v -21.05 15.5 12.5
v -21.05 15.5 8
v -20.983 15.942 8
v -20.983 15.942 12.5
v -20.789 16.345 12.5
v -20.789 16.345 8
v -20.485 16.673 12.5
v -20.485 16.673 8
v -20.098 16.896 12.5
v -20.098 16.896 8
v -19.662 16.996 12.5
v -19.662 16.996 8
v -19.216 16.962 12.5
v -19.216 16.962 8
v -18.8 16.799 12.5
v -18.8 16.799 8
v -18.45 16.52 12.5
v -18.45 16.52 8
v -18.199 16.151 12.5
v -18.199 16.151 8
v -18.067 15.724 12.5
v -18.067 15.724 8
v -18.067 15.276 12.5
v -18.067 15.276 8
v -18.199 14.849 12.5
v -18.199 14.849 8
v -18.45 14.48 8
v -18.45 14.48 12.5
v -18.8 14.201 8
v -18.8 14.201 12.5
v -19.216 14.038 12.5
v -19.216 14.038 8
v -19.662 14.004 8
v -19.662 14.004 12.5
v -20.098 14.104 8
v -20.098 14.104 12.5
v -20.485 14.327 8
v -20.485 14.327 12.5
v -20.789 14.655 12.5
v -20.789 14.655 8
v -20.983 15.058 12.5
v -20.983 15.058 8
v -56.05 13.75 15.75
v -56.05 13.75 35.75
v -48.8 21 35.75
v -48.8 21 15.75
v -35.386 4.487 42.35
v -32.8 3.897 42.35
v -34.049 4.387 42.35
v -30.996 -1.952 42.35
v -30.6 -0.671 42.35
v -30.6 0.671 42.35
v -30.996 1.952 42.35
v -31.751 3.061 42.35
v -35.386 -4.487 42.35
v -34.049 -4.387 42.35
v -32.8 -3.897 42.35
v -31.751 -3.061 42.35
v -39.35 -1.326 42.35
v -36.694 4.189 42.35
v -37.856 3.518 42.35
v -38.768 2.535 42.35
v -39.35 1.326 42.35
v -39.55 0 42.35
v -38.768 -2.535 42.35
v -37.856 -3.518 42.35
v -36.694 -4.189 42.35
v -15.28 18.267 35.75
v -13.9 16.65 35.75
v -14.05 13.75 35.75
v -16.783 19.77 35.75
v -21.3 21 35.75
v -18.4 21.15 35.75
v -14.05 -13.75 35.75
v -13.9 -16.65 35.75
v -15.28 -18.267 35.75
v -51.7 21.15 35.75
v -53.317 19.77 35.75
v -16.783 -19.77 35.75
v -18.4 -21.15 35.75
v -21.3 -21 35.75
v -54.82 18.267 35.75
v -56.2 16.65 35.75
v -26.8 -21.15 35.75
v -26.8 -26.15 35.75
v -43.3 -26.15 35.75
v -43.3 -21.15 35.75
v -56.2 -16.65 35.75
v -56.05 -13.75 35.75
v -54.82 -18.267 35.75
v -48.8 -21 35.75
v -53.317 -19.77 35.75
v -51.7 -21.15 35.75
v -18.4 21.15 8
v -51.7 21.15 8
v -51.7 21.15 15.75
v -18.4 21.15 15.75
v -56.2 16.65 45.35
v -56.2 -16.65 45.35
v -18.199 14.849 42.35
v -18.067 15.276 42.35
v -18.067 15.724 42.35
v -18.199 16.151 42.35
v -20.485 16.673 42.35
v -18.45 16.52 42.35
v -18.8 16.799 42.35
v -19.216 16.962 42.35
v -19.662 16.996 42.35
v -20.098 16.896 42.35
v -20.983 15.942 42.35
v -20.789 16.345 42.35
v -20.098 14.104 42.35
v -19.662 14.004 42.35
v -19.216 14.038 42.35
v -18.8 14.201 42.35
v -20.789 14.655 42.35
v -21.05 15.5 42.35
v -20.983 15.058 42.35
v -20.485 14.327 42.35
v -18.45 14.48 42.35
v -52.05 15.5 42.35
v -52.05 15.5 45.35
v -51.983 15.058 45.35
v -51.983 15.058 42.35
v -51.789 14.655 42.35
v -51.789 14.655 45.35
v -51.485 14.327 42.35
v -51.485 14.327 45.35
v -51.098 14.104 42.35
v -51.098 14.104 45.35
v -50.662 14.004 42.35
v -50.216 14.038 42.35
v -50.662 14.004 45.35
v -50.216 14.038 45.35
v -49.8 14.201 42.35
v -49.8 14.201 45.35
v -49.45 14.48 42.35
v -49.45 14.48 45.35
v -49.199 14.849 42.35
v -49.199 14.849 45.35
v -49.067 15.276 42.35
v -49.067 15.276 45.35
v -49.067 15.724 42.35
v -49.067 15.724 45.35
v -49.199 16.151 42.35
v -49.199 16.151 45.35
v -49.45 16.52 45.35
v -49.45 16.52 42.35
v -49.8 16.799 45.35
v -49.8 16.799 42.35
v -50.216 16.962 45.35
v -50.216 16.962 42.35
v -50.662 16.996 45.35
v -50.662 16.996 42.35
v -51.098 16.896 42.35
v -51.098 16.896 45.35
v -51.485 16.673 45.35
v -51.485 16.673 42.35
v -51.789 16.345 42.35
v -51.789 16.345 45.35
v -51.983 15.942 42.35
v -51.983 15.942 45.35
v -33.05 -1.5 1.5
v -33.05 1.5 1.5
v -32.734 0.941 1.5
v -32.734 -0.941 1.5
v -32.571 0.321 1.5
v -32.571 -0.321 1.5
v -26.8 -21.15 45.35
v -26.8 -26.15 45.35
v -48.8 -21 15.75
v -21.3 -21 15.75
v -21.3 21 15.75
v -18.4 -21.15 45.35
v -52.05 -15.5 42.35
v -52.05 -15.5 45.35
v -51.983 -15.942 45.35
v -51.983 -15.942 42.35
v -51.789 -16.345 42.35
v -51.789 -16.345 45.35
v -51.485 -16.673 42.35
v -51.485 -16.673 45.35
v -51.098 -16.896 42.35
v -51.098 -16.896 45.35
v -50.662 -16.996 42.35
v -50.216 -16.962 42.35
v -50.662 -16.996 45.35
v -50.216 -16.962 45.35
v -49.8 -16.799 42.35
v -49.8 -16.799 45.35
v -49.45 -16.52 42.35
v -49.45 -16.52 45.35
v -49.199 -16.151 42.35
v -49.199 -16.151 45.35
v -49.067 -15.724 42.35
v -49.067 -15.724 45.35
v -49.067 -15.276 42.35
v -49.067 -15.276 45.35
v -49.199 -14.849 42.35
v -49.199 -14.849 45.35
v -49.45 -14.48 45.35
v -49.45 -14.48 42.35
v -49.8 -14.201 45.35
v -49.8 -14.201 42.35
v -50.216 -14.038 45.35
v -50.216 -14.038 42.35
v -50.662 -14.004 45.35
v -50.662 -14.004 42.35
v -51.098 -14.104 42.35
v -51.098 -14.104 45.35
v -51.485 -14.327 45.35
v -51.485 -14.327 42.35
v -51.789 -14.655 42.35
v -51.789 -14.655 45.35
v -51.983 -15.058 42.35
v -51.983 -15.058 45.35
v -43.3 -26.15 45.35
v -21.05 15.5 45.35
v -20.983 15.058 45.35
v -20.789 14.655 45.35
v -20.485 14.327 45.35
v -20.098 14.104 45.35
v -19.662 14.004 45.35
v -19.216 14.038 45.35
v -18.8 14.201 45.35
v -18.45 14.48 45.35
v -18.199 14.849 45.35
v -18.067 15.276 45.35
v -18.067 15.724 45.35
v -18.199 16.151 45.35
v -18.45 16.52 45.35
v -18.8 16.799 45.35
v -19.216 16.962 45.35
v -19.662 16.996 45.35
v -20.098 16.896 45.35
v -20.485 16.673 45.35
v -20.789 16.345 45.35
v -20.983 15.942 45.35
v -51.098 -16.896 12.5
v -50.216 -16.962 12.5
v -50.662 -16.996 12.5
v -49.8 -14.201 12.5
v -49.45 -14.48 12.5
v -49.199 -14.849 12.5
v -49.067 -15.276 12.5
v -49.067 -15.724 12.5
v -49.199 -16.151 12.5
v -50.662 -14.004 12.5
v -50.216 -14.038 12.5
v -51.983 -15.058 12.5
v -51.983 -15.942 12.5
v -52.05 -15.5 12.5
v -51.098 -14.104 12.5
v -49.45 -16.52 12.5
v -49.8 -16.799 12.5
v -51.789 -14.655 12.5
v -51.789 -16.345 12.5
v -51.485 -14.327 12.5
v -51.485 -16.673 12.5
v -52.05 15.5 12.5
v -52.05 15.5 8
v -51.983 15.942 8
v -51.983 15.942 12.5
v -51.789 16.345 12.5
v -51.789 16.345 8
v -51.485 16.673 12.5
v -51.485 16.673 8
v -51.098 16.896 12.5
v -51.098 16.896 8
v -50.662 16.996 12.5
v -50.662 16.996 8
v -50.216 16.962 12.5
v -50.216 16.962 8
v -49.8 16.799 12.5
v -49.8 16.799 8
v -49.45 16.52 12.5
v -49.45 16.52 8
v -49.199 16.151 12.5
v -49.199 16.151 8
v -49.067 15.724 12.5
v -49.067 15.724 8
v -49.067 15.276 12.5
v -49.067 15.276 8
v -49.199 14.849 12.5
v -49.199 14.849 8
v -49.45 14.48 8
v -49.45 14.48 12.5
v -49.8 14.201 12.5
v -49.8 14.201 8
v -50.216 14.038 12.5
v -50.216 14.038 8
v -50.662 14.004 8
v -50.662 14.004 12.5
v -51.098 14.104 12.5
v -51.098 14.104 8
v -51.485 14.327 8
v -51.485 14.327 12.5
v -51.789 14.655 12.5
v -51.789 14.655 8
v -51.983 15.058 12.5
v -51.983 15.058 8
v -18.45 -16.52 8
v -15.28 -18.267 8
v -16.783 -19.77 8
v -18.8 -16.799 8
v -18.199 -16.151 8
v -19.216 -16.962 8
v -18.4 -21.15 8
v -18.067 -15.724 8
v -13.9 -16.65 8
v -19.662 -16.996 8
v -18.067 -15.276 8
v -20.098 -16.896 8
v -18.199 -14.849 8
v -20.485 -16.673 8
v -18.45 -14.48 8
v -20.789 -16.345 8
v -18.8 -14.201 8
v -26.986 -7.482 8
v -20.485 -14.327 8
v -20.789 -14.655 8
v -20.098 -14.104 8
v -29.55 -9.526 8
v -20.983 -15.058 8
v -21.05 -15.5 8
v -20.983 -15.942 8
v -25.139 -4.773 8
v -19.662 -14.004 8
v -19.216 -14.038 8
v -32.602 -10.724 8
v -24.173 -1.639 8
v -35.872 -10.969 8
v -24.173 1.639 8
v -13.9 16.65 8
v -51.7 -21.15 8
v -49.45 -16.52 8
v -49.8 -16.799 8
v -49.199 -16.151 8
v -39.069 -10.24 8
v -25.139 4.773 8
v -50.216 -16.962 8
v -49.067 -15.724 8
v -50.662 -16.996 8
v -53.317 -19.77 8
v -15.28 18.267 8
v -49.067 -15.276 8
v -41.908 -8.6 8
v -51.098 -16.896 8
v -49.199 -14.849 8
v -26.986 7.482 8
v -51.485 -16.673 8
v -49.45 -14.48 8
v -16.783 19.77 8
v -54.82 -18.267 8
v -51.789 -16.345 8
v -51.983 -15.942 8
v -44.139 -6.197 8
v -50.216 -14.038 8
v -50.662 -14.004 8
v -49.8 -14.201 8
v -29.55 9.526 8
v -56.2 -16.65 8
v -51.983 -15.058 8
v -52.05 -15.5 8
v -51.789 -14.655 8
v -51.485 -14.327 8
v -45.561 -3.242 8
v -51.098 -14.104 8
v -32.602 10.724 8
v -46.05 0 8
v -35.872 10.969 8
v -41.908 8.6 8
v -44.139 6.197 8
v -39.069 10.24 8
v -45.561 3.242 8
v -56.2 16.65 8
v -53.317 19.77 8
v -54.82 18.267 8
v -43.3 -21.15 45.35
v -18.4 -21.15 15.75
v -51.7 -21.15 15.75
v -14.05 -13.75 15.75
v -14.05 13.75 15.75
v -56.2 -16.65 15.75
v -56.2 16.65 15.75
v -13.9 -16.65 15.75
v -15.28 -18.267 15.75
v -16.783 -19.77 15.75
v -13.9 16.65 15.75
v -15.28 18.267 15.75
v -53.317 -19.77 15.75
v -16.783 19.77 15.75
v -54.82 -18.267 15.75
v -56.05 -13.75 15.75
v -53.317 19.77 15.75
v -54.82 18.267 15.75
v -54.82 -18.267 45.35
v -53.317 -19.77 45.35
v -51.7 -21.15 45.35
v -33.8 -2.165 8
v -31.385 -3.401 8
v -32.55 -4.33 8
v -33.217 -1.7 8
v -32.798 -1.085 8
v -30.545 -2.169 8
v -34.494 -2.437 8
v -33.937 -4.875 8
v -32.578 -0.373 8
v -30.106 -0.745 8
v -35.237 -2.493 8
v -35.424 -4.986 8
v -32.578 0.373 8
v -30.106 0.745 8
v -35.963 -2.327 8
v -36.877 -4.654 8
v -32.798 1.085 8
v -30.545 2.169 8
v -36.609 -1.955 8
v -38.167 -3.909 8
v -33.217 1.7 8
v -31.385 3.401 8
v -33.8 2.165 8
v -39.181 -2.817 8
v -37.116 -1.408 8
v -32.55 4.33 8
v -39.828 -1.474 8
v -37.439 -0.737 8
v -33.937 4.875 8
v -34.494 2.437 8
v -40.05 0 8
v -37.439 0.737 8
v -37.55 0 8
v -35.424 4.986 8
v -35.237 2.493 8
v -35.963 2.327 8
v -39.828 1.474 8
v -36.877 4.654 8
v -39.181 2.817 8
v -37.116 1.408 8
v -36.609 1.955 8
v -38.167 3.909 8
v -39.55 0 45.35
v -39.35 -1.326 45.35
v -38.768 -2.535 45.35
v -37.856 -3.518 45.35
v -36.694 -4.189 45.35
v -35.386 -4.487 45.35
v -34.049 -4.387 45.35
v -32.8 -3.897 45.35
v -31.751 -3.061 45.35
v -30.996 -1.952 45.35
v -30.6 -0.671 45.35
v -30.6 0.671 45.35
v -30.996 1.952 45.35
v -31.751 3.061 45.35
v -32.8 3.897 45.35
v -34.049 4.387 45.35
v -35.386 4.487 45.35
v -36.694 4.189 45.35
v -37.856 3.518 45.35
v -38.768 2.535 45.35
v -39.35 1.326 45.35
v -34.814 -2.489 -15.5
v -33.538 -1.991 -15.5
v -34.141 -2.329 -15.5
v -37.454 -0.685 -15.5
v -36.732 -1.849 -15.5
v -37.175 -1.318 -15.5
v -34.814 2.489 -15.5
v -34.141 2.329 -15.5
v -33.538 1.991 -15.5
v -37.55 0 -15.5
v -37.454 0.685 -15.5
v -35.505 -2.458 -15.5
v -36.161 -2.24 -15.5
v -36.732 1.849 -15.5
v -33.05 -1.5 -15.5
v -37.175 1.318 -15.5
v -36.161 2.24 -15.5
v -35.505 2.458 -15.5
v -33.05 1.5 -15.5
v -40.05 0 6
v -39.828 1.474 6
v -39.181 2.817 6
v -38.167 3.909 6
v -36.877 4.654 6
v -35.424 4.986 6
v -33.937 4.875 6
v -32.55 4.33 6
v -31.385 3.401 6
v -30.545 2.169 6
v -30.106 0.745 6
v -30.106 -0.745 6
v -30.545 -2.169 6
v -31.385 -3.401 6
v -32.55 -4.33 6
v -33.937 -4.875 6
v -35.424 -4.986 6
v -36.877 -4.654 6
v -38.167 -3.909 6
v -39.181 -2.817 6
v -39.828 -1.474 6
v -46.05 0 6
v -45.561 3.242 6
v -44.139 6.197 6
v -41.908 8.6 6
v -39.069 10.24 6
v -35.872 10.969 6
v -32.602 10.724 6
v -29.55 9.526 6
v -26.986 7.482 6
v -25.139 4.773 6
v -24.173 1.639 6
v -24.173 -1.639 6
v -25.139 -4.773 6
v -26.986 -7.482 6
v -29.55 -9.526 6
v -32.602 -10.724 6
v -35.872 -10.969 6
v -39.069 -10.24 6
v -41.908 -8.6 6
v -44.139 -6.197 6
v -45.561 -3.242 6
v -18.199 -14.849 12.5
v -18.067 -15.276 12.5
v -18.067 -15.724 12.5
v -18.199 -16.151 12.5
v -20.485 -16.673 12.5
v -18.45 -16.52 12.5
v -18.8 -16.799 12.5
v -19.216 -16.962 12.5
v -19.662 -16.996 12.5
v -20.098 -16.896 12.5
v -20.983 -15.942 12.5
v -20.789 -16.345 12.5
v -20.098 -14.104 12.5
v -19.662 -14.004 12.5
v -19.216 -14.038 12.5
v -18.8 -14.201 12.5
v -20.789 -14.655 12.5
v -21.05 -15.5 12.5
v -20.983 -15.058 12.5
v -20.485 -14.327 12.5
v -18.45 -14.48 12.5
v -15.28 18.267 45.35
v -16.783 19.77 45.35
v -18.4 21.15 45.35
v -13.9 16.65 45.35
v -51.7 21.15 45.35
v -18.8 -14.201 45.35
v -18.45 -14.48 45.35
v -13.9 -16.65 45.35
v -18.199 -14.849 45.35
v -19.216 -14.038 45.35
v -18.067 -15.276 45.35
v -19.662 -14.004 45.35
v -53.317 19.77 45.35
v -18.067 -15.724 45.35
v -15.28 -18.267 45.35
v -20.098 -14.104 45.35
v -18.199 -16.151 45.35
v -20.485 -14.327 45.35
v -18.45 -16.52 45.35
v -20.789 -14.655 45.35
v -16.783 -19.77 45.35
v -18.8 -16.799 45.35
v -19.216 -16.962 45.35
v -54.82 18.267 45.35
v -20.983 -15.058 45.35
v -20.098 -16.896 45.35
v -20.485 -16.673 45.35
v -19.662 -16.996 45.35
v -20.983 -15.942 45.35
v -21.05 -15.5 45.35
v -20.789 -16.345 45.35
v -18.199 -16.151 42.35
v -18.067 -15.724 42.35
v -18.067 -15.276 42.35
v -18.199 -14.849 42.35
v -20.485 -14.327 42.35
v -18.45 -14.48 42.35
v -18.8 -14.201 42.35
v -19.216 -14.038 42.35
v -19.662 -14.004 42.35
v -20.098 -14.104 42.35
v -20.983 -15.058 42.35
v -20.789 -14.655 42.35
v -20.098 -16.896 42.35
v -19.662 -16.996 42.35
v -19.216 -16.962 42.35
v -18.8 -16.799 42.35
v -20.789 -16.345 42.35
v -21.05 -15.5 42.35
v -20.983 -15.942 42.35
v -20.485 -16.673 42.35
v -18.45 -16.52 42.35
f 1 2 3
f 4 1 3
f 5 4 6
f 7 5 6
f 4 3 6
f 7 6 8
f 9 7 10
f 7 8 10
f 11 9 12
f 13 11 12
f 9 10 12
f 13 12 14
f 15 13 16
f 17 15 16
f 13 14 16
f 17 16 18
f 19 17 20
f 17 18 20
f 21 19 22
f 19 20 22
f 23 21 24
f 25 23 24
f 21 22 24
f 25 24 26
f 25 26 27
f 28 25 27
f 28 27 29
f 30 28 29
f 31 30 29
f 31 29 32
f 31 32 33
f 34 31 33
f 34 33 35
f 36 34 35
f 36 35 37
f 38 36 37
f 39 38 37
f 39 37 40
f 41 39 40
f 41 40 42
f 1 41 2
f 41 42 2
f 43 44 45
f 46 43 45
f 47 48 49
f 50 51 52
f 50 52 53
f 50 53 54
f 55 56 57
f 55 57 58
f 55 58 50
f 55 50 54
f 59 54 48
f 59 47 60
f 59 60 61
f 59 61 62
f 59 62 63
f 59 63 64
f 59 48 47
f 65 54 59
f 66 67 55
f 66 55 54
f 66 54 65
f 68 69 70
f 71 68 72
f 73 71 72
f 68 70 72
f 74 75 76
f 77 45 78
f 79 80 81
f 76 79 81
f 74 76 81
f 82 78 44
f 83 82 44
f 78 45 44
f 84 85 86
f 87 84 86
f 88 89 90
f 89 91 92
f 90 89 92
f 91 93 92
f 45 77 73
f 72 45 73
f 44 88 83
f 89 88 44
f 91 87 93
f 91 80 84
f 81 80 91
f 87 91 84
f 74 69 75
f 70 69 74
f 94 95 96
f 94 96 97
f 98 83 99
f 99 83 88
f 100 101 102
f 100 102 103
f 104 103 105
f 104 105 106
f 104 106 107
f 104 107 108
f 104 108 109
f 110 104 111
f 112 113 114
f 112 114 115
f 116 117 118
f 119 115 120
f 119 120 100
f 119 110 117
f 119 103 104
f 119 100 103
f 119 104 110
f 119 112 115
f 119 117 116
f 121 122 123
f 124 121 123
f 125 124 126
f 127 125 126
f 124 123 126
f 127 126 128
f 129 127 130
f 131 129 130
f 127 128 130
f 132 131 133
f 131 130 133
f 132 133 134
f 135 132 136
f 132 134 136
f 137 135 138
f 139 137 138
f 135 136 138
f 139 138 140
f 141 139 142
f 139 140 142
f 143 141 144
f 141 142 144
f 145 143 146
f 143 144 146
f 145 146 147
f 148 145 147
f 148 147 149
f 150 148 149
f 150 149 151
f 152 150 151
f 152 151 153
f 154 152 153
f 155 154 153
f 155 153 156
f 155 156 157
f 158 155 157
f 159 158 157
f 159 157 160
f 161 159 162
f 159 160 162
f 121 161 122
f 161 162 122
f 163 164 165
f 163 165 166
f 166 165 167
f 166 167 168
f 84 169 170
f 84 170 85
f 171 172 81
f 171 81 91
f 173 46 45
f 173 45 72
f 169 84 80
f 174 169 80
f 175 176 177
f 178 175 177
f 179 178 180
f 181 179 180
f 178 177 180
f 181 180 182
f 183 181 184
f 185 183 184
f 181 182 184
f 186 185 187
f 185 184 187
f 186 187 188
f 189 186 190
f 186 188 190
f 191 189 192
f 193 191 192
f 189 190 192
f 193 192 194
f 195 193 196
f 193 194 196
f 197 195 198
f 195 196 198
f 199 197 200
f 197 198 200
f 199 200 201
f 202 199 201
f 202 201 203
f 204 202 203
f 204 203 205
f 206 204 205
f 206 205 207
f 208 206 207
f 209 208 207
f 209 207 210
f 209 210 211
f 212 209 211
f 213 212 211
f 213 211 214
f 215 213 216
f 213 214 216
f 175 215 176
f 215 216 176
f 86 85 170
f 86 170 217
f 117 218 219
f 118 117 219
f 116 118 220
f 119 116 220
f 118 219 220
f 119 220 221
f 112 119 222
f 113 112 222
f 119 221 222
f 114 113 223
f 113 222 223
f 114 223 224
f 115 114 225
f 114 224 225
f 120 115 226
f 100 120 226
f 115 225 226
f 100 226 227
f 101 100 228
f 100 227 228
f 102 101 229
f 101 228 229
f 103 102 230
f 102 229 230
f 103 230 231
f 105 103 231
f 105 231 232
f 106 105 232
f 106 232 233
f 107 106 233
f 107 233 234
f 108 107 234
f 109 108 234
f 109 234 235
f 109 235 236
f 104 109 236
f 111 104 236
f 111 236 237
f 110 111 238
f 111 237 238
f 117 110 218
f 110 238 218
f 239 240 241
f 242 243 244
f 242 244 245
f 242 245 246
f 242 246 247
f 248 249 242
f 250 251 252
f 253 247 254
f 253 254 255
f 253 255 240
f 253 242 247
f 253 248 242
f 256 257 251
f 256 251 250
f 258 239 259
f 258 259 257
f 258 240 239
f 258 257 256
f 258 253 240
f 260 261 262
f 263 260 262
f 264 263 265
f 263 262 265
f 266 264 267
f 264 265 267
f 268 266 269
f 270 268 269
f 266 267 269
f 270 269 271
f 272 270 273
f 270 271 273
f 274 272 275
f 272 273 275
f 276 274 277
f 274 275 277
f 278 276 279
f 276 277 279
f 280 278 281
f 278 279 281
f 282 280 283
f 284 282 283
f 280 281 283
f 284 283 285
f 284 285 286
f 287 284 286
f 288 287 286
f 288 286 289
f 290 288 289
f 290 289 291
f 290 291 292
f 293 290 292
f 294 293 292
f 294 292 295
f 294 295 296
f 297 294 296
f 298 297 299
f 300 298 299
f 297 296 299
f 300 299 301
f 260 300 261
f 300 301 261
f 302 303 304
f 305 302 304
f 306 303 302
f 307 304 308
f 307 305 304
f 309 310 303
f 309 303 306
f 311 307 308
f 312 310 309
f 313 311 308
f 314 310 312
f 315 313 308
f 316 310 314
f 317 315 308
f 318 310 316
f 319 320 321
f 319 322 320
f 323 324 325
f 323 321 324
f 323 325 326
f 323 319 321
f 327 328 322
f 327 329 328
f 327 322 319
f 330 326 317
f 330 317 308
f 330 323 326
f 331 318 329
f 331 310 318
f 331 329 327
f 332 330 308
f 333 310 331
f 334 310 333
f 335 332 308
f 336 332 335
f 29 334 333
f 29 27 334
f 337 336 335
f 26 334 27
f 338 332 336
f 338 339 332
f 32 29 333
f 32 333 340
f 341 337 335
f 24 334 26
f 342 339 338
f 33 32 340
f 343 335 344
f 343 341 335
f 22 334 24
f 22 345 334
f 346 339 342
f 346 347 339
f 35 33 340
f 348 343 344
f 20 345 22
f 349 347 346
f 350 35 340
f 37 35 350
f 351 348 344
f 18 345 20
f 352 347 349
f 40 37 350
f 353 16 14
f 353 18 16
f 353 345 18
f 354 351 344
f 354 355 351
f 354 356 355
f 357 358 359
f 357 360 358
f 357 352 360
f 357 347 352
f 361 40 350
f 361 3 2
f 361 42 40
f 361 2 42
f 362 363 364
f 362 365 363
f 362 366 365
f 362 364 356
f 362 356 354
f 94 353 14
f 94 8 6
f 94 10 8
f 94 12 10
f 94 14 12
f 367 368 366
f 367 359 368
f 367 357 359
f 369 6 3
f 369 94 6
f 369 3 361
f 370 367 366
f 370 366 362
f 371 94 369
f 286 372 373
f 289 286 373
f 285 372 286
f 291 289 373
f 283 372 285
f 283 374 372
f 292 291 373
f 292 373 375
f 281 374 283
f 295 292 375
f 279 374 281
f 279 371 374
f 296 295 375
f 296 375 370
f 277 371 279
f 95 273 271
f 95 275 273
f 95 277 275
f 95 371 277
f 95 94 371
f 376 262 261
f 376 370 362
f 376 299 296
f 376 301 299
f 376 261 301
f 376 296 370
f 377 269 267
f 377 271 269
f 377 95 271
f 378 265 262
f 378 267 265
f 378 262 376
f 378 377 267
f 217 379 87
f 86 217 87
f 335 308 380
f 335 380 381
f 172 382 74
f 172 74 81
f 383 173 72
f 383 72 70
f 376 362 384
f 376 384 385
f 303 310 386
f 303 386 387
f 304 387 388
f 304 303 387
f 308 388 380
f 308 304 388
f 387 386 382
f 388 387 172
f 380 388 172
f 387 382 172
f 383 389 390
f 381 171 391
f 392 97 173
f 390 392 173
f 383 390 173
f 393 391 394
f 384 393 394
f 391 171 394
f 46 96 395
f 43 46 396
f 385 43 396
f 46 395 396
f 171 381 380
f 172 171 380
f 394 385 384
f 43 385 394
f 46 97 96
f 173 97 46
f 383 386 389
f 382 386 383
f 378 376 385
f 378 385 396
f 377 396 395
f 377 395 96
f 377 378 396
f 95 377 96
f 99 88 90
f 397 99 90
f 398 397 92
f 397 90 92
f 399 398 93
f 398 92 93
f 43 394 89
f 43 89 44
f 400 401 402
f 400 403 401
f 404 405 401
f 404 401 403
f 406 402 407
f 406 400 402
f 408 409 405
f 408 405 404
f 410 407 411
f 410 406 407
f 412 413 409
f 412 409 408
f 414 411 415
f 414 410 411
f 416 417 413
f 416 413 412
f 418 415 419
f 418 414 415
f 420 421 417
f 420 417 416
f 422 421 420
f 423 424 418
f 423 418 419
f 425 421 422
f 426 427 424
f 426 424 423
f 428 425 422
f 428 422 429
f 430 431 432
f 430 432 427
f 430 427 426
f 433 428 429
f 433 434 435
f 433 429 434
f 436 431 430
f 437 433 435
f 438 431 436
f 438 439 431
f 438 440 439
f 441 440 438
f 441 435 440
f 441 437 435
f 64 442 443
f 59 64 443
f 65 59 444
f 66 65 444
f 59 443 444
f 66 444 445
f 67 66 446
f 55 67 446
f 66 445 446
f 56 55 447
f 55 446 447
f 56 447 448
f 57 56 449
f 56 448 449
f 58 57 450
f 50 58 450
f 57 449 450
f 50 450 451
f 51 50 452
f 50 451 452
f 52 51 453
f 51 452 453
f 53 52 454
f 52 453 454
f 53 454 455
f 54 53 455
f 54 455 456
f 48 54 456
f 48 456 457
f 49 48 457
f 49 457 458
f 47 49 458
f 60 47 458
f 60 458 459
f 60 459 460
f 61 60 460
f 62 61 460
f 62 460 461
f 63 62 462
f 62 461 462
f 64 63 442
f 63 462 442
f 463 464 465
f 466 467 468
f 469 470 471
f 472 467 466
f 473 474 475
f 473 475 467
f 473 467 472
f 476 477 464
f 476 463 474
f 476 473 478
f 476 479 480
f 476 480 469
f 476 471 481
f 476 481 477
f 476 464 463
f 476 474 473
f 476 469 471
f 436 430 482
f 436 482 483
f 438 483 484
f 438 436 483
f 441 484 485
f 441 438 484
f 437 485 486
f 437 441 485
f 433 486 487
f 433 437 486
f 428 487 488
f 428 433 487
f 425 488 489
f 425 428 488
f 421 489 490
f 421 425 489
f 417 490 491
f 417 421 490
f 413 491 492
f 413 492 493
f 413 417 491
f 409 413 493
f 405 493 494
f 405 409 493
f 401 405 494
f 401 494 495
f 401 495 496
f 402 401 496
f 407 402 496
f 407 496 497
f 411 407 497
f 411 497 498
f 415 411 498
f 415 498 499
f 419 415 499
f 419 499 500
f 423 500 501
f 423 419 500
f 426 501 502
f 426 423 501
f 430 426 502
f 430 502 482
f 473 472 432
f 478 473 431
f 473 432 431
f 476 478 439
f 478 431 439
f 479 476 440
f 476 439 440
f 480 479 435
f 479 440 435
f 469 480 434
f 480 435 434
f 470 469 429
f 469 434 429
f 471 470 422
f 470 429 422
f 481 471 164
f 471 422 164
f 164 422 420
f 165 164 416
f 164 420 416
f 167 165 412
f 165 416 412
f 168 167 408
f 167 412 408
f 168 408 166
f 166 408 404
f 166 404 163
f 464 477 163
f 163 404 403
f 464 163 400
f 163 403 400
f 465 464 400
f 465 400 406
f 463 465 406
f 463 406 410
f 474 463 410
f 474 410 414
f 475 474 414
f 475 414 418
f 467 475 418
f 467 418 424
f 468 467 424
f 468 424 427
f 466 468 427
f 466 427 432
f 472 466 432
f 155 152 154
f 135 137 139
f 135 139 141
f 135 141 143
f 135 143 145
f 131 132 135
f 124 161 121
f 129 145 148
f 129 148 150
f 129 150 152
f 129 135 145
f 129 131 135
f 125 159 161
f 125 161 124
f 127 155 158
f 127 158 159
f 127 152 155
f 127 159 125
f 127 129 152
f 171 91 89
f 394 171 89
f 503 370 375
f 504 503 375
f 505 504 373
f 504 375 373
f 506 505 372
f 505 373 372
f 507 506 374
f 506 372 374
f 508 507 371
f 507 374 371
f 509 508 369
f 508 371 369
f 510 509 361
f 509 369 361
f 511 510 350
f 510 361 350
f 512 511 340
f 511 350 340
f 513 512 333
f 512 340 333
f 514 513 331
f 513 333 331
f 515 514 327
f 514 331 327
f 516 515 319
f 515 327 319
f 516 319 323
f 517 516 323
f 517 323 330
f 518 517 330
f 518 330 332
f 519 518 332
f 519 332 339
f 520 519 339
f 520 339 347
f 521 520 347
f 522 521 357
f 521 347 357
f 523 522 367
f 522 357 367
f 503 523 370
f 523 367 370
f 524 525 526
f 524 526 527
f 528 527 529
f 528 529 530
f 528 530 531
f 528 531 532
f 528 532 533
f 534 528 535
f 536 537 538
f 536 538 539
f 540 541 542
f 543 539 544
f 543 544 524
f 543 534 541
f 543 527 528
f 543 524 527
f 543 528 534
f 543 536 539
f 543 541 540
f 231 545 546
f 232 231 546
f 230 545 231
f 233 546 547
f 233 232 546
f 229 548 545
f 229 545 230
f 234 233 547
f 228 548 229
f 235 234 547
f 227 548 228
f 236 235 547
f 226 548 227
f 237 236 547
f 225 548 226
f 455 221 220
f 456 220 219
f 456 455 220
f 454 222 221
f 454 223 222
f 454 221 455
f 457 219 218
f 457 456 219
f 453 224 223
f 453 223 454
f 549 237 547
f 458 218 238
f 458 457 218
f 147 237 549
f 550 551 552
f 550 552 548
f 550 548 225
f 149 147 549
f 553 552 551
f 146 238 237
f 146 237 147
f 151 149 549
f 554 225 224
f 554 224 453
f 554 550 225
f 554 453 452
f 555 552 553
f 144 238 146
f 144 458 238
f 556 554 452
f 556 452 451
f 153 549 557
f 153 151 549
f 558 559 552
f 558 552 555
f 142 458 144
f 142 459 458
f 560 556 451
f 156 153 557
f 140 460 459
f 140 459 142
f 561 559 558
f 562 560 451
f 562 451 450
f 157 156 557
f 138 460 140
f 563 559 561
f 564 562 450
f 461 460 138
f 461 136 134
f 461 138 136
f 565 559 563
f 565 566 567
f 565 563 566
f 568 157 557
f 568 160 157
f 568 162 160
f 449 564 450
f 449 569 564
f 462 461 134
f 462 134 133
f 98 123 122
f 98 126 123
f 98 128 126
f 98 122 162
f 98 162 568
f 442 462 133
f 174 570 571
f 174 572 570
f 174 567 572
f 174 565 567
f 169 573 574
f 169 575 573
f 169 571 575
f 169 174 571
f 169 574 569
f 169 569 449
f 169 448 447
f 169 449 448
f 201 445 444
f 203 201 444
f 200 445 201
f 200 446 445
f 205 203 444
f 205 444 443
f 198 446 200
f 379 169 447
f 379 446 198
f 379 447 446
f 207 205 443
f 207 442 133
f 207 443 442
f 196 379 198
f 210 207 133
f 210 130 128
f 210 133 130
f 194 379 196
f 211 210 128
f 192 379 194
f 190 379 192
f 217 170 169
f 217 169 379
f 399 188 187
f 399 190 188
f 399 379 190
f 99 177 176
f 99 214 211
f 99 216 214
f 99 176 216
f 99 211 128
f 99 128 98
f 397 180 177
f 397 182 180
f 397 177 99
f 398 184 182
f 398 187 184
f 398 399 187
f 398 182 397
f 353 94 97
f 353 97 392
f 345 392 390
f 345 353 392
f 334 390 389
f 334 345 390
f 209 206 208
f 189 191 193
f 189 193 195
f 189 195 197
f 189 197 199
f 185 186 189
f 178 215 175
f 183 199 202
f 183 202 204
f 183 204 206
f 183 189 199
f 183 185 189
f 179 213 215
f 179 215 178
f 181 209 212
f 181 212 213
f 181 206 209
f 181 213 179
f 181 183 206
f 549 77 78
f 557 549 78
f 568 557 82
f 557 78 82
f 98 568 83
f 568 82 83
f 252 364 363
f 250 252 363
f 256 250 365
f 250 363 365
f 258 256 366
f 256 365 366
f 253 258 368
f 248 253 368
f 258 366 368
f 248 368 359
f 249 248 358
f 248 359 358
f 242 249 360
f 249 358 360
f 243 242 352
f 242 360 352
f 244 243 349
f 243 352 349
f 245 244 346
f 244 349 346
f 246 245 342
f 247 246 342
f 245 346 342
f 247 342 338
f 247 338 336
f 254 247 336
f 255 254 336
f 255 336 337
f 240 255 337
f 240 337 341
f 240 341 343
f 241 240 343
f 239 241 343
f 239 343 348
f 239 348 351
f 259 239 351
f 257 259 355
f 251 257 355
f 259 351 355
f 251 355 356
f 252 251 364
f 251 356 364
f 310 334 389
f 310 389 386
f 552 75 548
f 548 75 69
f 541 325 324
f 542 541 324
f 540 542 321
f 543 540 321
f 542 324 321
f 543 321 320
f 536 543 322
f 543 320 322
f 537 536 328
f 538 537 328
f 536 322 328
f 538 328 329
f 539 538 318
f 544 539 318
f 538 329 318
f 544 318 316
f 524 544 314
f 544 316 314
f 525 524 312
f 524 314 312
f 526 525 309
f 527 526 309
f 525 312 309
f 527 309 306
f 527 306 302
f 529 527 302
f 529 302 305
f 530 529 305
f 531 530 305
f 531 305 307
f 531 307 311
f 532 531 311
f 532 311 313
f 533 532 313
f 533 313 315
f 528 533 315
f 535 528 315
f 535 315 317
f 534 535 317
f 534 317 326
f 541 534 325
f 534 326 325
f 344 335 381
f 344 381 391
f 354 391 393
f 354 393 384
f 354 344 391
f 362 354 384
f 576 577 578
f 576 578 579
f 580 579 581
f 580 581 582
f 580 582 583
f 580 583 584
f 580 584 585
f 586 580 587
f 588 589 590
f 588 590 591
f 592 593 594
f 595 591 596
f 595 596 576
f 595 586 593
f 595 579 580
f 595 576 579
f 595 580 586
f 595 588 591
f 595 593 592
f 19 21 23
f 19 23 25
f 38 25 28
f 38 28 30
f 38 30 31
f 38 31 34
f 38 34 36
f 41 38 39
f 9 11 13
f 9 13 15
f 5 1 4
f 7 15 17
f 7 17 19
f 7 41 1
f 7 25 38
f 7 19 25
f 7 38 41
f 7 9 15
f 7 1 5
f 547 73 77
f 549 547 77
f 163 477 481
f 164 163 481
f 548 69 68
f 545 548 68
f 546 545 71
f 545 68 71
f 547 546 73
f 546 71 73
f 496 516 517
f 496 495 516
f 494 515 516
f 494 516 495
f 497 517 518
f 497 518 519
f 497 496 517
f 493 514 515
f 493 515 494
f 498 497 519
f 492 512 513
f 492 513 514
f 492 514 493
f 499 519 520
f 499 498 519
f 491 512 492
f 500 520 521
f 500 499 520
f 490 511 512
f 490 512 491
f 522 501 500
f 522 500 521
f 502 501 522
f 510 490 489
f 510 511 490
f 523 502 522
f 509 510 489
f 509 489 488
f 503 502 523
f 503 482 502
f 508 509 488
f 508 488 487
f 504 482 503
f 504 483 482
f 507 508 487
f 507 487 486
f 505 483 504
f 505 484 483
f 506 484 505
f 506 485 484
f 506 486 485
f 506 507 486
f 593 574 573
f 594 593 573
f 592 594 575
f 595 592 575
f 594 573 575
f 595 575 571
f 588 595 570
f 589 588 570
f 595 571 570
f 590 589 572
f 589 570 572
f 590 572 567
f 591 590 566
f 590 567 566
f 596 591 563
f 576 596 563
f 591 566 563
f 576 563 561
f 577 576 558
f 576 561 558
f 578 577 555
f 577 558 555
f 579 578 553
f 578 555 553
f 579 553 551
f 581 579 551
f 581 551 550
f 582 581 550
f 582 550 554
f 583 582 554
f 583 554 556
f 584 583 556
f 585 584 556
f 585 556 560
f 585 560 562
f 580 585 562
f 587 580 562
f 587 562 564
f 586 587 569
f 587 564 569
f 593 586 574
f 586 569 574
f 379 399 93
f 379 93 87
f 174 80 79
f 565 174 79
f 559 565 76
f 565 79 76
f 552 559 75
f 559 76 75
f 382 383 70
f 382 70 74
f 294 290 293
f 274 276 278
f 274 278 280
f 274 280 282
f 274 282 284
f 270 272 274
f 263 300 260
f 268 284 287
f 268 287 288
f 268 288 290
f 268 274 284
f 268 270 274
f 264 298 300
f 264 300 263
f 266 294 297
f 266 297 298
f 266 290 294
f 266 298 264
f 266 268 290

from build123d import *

# Parameters (mm, degrees)
PAD009_DEPTH              = 7.75
PAD010_DEPTH              = 20
PAD011_DEPTH              = 9.6
SKETCH017_R               = 1.5
POCKET004_DEPTH           = 4.5
SKETCH018_R               = 11
SKETCH018_R_2             = 5
PAD012_DEPTH              = 2
SKETCH019_R               = 2.5
PAD013_DEPTH              = 23.5
SKETCH020_W               = 0.5
SKETCH020_H               = 3
POCKET005_DEPTH           = 17
SKETCH021_R               = 1.5
SKETCH021_R_2             = 4.5
POCKET006_DEPTH           = 3
SKETCH022_W               = 16.5
SKETCH022_H               = 9.6
PAD014_DEPTH              = 5
CLONEBODY_PLACEMENT_ANGLE = 180


with BuildPart() as part:
    # Sketch014 → Pad009 (new body)
    with BuildSketch(Plane.XY):
        with BuildLine():
            Line((-16.65, -21.15), (16.65, -21.15))
            ThreePointArc((16.65, -21.15), (19.033457, -19.033457), (21.15, -16.65))
            Line((21.15, -16.65), (21.15, 16.65))
            ThreePointArc((21.15, 16.65), (19.033457, 19.033457), (16.65, 21.15))
            Line((16.65, 21.15), (-16.65, 21.15))
            ThreePointArc((-16.65, 21.15), (-19.033457, 19.033457), (-21.15, 16.65))
            Line((-21.15, 16.65), (-21.15, -16.65))
            ThreePointArc((-21.15, -16.65), (-19.033457, -19.033457), (-16.65, -21.15))
        make_face()
    extrude(amount=-PAD009_DEPTH)

    # Sketch015 (on Face10 of Pad009) → Pad010 (join)
    with BuildSketch(Plane(origin=(0, 0, -7.75), x_dir=(1, 0, 0), z_dir=(0, 0, -1))):
        Polygon((-21, -13.75), (-21, 13.75), (-13.75, 21), (13.75, 21), (21, 13.75), (21, -13.75), (13.75, -21), (-13.75, -21), align=None)
    extrude(amount=PAD010_DEPTH)

    # Sketch016 (on Face19 of Pad010) → Pad011 (join)
    with BuildSketch(Plane(origin=(0, 0, -27.75), x_dir=(1, 0, 0), z_dir=(0, 0, -1))):
        with BuildLine():
            Line((-16.65, -21.15), (16.65, -21.15))
            ThreePointArc((16.65, -21.15), (19.033457, -19.033457), (21.15, -16.65))
            Line((21.15, -16.65), (21.15, 16.65))
            ThreePointArc((21.15, 16.65), (19.033457, 19.033457), (16.65, 21.15))
            Line((16.65, 21.15), (-16.65, 21.15))
            ThreePointArc((-16.65, 21.15), (-19.033457, 19.033457), (-21.15, 16.65))
            Line((-21.15, 16.65), (-21.15, -16.65))
            ThreePointArc((-21.15, -16.65), (-19.033457, -19.033457), (-16.65, -21.15))
        make_face()
    extrude(amount=PAD011_DEPTH)

    # Sketch017 (on Face4 of Pad011) → Pocket004 (cut)
    with BuildSketch(Plane.XY):
        with Locations((-15.5, 15.5)):
            Circle(SKETCH017_R)
        with Locations((15.5, 15.5)):
            Circle(SKETCH017_R)
        with Locations((15.5, -15.5)):
            Circle(SKETCH017_R)
        with Locations((-15.5, -15.5)):
            Circle(SKETCH017_R)
    extrude(amount=-POCKET004_DEPTH, mode=Mode.SUBTRACT)

    # Sketch018 (on Face4 of Pocket004) → Pad012 (join)
    with BuildSketch(Plane.XY):
        Circle(SKETCH018_R)
        Circle(SKETCH018_R_2, mode=Mode.SUBTRACT)
    extrude(amount=PAD012_DEPTH)

    # Sketch019 (on Face39 of Pad012) → Pad013 (join)
    with BuildSketch(Plane.XY):
        Circle(SKETCH019_R)
    extrude(amount=PAD013_DEPTH)

    # Sketch020 (on Face42 of Pad013) → Pocket005 (cut)
    with BuildSketch(Plane.XY.offset(23.5)):
        with Locations((-2.25, 0)):
            Rectangle(SKETCH020_W, SKETCH020_H)
    extrude(amount=-POCKET005_DEPTH, mode=Mode.SUBTRACT)

    # Sketch021 (on Face40 of Pocket005) → Pocket006 (cut)
    with BuildSketch(Plane(origin=(0, 0, -37.35), x_dir=(1, 0, 0), z_dir=(0, 0, -1))):
        with Locations((-15.5, 15.5)):
            Circle(SKETCH021_R)
        with Locations((15.5, 15.5)):
            Circle(SKETCH021_R)
        with Locations((15.5, -15.5)):
            Circle(SKETCH021_R)
        with Locations((-15.5, -15.5)):
            Circle(SKETCH021_R)
        Circle(SKETCH021_R_2)
    extrude(amount=-POCKET006_DEPTH, mode=Mode.SUBTRACT)

    # Sketch022 (on Face38 of Pocket006) → Pad014 (join)
    with BuildSketch(Plane.XZ.offset(21.15)):
        with Locations((0, -32.55)):
            Rectangle(SKETCH022_W, SKETCH022_H)
    extrude(amount=PAD014_DEPTH)


with BuildPart() as part_1:
    # CloneBody placement: moved
    add(part.part.moved(Location((-35.05, 0, 8))).rotate(Axis((-35.05, 0, 8), (0, 1, 0)), CLONEBODY_PLACEMENT_ANGLE))


solid = part_1.part
